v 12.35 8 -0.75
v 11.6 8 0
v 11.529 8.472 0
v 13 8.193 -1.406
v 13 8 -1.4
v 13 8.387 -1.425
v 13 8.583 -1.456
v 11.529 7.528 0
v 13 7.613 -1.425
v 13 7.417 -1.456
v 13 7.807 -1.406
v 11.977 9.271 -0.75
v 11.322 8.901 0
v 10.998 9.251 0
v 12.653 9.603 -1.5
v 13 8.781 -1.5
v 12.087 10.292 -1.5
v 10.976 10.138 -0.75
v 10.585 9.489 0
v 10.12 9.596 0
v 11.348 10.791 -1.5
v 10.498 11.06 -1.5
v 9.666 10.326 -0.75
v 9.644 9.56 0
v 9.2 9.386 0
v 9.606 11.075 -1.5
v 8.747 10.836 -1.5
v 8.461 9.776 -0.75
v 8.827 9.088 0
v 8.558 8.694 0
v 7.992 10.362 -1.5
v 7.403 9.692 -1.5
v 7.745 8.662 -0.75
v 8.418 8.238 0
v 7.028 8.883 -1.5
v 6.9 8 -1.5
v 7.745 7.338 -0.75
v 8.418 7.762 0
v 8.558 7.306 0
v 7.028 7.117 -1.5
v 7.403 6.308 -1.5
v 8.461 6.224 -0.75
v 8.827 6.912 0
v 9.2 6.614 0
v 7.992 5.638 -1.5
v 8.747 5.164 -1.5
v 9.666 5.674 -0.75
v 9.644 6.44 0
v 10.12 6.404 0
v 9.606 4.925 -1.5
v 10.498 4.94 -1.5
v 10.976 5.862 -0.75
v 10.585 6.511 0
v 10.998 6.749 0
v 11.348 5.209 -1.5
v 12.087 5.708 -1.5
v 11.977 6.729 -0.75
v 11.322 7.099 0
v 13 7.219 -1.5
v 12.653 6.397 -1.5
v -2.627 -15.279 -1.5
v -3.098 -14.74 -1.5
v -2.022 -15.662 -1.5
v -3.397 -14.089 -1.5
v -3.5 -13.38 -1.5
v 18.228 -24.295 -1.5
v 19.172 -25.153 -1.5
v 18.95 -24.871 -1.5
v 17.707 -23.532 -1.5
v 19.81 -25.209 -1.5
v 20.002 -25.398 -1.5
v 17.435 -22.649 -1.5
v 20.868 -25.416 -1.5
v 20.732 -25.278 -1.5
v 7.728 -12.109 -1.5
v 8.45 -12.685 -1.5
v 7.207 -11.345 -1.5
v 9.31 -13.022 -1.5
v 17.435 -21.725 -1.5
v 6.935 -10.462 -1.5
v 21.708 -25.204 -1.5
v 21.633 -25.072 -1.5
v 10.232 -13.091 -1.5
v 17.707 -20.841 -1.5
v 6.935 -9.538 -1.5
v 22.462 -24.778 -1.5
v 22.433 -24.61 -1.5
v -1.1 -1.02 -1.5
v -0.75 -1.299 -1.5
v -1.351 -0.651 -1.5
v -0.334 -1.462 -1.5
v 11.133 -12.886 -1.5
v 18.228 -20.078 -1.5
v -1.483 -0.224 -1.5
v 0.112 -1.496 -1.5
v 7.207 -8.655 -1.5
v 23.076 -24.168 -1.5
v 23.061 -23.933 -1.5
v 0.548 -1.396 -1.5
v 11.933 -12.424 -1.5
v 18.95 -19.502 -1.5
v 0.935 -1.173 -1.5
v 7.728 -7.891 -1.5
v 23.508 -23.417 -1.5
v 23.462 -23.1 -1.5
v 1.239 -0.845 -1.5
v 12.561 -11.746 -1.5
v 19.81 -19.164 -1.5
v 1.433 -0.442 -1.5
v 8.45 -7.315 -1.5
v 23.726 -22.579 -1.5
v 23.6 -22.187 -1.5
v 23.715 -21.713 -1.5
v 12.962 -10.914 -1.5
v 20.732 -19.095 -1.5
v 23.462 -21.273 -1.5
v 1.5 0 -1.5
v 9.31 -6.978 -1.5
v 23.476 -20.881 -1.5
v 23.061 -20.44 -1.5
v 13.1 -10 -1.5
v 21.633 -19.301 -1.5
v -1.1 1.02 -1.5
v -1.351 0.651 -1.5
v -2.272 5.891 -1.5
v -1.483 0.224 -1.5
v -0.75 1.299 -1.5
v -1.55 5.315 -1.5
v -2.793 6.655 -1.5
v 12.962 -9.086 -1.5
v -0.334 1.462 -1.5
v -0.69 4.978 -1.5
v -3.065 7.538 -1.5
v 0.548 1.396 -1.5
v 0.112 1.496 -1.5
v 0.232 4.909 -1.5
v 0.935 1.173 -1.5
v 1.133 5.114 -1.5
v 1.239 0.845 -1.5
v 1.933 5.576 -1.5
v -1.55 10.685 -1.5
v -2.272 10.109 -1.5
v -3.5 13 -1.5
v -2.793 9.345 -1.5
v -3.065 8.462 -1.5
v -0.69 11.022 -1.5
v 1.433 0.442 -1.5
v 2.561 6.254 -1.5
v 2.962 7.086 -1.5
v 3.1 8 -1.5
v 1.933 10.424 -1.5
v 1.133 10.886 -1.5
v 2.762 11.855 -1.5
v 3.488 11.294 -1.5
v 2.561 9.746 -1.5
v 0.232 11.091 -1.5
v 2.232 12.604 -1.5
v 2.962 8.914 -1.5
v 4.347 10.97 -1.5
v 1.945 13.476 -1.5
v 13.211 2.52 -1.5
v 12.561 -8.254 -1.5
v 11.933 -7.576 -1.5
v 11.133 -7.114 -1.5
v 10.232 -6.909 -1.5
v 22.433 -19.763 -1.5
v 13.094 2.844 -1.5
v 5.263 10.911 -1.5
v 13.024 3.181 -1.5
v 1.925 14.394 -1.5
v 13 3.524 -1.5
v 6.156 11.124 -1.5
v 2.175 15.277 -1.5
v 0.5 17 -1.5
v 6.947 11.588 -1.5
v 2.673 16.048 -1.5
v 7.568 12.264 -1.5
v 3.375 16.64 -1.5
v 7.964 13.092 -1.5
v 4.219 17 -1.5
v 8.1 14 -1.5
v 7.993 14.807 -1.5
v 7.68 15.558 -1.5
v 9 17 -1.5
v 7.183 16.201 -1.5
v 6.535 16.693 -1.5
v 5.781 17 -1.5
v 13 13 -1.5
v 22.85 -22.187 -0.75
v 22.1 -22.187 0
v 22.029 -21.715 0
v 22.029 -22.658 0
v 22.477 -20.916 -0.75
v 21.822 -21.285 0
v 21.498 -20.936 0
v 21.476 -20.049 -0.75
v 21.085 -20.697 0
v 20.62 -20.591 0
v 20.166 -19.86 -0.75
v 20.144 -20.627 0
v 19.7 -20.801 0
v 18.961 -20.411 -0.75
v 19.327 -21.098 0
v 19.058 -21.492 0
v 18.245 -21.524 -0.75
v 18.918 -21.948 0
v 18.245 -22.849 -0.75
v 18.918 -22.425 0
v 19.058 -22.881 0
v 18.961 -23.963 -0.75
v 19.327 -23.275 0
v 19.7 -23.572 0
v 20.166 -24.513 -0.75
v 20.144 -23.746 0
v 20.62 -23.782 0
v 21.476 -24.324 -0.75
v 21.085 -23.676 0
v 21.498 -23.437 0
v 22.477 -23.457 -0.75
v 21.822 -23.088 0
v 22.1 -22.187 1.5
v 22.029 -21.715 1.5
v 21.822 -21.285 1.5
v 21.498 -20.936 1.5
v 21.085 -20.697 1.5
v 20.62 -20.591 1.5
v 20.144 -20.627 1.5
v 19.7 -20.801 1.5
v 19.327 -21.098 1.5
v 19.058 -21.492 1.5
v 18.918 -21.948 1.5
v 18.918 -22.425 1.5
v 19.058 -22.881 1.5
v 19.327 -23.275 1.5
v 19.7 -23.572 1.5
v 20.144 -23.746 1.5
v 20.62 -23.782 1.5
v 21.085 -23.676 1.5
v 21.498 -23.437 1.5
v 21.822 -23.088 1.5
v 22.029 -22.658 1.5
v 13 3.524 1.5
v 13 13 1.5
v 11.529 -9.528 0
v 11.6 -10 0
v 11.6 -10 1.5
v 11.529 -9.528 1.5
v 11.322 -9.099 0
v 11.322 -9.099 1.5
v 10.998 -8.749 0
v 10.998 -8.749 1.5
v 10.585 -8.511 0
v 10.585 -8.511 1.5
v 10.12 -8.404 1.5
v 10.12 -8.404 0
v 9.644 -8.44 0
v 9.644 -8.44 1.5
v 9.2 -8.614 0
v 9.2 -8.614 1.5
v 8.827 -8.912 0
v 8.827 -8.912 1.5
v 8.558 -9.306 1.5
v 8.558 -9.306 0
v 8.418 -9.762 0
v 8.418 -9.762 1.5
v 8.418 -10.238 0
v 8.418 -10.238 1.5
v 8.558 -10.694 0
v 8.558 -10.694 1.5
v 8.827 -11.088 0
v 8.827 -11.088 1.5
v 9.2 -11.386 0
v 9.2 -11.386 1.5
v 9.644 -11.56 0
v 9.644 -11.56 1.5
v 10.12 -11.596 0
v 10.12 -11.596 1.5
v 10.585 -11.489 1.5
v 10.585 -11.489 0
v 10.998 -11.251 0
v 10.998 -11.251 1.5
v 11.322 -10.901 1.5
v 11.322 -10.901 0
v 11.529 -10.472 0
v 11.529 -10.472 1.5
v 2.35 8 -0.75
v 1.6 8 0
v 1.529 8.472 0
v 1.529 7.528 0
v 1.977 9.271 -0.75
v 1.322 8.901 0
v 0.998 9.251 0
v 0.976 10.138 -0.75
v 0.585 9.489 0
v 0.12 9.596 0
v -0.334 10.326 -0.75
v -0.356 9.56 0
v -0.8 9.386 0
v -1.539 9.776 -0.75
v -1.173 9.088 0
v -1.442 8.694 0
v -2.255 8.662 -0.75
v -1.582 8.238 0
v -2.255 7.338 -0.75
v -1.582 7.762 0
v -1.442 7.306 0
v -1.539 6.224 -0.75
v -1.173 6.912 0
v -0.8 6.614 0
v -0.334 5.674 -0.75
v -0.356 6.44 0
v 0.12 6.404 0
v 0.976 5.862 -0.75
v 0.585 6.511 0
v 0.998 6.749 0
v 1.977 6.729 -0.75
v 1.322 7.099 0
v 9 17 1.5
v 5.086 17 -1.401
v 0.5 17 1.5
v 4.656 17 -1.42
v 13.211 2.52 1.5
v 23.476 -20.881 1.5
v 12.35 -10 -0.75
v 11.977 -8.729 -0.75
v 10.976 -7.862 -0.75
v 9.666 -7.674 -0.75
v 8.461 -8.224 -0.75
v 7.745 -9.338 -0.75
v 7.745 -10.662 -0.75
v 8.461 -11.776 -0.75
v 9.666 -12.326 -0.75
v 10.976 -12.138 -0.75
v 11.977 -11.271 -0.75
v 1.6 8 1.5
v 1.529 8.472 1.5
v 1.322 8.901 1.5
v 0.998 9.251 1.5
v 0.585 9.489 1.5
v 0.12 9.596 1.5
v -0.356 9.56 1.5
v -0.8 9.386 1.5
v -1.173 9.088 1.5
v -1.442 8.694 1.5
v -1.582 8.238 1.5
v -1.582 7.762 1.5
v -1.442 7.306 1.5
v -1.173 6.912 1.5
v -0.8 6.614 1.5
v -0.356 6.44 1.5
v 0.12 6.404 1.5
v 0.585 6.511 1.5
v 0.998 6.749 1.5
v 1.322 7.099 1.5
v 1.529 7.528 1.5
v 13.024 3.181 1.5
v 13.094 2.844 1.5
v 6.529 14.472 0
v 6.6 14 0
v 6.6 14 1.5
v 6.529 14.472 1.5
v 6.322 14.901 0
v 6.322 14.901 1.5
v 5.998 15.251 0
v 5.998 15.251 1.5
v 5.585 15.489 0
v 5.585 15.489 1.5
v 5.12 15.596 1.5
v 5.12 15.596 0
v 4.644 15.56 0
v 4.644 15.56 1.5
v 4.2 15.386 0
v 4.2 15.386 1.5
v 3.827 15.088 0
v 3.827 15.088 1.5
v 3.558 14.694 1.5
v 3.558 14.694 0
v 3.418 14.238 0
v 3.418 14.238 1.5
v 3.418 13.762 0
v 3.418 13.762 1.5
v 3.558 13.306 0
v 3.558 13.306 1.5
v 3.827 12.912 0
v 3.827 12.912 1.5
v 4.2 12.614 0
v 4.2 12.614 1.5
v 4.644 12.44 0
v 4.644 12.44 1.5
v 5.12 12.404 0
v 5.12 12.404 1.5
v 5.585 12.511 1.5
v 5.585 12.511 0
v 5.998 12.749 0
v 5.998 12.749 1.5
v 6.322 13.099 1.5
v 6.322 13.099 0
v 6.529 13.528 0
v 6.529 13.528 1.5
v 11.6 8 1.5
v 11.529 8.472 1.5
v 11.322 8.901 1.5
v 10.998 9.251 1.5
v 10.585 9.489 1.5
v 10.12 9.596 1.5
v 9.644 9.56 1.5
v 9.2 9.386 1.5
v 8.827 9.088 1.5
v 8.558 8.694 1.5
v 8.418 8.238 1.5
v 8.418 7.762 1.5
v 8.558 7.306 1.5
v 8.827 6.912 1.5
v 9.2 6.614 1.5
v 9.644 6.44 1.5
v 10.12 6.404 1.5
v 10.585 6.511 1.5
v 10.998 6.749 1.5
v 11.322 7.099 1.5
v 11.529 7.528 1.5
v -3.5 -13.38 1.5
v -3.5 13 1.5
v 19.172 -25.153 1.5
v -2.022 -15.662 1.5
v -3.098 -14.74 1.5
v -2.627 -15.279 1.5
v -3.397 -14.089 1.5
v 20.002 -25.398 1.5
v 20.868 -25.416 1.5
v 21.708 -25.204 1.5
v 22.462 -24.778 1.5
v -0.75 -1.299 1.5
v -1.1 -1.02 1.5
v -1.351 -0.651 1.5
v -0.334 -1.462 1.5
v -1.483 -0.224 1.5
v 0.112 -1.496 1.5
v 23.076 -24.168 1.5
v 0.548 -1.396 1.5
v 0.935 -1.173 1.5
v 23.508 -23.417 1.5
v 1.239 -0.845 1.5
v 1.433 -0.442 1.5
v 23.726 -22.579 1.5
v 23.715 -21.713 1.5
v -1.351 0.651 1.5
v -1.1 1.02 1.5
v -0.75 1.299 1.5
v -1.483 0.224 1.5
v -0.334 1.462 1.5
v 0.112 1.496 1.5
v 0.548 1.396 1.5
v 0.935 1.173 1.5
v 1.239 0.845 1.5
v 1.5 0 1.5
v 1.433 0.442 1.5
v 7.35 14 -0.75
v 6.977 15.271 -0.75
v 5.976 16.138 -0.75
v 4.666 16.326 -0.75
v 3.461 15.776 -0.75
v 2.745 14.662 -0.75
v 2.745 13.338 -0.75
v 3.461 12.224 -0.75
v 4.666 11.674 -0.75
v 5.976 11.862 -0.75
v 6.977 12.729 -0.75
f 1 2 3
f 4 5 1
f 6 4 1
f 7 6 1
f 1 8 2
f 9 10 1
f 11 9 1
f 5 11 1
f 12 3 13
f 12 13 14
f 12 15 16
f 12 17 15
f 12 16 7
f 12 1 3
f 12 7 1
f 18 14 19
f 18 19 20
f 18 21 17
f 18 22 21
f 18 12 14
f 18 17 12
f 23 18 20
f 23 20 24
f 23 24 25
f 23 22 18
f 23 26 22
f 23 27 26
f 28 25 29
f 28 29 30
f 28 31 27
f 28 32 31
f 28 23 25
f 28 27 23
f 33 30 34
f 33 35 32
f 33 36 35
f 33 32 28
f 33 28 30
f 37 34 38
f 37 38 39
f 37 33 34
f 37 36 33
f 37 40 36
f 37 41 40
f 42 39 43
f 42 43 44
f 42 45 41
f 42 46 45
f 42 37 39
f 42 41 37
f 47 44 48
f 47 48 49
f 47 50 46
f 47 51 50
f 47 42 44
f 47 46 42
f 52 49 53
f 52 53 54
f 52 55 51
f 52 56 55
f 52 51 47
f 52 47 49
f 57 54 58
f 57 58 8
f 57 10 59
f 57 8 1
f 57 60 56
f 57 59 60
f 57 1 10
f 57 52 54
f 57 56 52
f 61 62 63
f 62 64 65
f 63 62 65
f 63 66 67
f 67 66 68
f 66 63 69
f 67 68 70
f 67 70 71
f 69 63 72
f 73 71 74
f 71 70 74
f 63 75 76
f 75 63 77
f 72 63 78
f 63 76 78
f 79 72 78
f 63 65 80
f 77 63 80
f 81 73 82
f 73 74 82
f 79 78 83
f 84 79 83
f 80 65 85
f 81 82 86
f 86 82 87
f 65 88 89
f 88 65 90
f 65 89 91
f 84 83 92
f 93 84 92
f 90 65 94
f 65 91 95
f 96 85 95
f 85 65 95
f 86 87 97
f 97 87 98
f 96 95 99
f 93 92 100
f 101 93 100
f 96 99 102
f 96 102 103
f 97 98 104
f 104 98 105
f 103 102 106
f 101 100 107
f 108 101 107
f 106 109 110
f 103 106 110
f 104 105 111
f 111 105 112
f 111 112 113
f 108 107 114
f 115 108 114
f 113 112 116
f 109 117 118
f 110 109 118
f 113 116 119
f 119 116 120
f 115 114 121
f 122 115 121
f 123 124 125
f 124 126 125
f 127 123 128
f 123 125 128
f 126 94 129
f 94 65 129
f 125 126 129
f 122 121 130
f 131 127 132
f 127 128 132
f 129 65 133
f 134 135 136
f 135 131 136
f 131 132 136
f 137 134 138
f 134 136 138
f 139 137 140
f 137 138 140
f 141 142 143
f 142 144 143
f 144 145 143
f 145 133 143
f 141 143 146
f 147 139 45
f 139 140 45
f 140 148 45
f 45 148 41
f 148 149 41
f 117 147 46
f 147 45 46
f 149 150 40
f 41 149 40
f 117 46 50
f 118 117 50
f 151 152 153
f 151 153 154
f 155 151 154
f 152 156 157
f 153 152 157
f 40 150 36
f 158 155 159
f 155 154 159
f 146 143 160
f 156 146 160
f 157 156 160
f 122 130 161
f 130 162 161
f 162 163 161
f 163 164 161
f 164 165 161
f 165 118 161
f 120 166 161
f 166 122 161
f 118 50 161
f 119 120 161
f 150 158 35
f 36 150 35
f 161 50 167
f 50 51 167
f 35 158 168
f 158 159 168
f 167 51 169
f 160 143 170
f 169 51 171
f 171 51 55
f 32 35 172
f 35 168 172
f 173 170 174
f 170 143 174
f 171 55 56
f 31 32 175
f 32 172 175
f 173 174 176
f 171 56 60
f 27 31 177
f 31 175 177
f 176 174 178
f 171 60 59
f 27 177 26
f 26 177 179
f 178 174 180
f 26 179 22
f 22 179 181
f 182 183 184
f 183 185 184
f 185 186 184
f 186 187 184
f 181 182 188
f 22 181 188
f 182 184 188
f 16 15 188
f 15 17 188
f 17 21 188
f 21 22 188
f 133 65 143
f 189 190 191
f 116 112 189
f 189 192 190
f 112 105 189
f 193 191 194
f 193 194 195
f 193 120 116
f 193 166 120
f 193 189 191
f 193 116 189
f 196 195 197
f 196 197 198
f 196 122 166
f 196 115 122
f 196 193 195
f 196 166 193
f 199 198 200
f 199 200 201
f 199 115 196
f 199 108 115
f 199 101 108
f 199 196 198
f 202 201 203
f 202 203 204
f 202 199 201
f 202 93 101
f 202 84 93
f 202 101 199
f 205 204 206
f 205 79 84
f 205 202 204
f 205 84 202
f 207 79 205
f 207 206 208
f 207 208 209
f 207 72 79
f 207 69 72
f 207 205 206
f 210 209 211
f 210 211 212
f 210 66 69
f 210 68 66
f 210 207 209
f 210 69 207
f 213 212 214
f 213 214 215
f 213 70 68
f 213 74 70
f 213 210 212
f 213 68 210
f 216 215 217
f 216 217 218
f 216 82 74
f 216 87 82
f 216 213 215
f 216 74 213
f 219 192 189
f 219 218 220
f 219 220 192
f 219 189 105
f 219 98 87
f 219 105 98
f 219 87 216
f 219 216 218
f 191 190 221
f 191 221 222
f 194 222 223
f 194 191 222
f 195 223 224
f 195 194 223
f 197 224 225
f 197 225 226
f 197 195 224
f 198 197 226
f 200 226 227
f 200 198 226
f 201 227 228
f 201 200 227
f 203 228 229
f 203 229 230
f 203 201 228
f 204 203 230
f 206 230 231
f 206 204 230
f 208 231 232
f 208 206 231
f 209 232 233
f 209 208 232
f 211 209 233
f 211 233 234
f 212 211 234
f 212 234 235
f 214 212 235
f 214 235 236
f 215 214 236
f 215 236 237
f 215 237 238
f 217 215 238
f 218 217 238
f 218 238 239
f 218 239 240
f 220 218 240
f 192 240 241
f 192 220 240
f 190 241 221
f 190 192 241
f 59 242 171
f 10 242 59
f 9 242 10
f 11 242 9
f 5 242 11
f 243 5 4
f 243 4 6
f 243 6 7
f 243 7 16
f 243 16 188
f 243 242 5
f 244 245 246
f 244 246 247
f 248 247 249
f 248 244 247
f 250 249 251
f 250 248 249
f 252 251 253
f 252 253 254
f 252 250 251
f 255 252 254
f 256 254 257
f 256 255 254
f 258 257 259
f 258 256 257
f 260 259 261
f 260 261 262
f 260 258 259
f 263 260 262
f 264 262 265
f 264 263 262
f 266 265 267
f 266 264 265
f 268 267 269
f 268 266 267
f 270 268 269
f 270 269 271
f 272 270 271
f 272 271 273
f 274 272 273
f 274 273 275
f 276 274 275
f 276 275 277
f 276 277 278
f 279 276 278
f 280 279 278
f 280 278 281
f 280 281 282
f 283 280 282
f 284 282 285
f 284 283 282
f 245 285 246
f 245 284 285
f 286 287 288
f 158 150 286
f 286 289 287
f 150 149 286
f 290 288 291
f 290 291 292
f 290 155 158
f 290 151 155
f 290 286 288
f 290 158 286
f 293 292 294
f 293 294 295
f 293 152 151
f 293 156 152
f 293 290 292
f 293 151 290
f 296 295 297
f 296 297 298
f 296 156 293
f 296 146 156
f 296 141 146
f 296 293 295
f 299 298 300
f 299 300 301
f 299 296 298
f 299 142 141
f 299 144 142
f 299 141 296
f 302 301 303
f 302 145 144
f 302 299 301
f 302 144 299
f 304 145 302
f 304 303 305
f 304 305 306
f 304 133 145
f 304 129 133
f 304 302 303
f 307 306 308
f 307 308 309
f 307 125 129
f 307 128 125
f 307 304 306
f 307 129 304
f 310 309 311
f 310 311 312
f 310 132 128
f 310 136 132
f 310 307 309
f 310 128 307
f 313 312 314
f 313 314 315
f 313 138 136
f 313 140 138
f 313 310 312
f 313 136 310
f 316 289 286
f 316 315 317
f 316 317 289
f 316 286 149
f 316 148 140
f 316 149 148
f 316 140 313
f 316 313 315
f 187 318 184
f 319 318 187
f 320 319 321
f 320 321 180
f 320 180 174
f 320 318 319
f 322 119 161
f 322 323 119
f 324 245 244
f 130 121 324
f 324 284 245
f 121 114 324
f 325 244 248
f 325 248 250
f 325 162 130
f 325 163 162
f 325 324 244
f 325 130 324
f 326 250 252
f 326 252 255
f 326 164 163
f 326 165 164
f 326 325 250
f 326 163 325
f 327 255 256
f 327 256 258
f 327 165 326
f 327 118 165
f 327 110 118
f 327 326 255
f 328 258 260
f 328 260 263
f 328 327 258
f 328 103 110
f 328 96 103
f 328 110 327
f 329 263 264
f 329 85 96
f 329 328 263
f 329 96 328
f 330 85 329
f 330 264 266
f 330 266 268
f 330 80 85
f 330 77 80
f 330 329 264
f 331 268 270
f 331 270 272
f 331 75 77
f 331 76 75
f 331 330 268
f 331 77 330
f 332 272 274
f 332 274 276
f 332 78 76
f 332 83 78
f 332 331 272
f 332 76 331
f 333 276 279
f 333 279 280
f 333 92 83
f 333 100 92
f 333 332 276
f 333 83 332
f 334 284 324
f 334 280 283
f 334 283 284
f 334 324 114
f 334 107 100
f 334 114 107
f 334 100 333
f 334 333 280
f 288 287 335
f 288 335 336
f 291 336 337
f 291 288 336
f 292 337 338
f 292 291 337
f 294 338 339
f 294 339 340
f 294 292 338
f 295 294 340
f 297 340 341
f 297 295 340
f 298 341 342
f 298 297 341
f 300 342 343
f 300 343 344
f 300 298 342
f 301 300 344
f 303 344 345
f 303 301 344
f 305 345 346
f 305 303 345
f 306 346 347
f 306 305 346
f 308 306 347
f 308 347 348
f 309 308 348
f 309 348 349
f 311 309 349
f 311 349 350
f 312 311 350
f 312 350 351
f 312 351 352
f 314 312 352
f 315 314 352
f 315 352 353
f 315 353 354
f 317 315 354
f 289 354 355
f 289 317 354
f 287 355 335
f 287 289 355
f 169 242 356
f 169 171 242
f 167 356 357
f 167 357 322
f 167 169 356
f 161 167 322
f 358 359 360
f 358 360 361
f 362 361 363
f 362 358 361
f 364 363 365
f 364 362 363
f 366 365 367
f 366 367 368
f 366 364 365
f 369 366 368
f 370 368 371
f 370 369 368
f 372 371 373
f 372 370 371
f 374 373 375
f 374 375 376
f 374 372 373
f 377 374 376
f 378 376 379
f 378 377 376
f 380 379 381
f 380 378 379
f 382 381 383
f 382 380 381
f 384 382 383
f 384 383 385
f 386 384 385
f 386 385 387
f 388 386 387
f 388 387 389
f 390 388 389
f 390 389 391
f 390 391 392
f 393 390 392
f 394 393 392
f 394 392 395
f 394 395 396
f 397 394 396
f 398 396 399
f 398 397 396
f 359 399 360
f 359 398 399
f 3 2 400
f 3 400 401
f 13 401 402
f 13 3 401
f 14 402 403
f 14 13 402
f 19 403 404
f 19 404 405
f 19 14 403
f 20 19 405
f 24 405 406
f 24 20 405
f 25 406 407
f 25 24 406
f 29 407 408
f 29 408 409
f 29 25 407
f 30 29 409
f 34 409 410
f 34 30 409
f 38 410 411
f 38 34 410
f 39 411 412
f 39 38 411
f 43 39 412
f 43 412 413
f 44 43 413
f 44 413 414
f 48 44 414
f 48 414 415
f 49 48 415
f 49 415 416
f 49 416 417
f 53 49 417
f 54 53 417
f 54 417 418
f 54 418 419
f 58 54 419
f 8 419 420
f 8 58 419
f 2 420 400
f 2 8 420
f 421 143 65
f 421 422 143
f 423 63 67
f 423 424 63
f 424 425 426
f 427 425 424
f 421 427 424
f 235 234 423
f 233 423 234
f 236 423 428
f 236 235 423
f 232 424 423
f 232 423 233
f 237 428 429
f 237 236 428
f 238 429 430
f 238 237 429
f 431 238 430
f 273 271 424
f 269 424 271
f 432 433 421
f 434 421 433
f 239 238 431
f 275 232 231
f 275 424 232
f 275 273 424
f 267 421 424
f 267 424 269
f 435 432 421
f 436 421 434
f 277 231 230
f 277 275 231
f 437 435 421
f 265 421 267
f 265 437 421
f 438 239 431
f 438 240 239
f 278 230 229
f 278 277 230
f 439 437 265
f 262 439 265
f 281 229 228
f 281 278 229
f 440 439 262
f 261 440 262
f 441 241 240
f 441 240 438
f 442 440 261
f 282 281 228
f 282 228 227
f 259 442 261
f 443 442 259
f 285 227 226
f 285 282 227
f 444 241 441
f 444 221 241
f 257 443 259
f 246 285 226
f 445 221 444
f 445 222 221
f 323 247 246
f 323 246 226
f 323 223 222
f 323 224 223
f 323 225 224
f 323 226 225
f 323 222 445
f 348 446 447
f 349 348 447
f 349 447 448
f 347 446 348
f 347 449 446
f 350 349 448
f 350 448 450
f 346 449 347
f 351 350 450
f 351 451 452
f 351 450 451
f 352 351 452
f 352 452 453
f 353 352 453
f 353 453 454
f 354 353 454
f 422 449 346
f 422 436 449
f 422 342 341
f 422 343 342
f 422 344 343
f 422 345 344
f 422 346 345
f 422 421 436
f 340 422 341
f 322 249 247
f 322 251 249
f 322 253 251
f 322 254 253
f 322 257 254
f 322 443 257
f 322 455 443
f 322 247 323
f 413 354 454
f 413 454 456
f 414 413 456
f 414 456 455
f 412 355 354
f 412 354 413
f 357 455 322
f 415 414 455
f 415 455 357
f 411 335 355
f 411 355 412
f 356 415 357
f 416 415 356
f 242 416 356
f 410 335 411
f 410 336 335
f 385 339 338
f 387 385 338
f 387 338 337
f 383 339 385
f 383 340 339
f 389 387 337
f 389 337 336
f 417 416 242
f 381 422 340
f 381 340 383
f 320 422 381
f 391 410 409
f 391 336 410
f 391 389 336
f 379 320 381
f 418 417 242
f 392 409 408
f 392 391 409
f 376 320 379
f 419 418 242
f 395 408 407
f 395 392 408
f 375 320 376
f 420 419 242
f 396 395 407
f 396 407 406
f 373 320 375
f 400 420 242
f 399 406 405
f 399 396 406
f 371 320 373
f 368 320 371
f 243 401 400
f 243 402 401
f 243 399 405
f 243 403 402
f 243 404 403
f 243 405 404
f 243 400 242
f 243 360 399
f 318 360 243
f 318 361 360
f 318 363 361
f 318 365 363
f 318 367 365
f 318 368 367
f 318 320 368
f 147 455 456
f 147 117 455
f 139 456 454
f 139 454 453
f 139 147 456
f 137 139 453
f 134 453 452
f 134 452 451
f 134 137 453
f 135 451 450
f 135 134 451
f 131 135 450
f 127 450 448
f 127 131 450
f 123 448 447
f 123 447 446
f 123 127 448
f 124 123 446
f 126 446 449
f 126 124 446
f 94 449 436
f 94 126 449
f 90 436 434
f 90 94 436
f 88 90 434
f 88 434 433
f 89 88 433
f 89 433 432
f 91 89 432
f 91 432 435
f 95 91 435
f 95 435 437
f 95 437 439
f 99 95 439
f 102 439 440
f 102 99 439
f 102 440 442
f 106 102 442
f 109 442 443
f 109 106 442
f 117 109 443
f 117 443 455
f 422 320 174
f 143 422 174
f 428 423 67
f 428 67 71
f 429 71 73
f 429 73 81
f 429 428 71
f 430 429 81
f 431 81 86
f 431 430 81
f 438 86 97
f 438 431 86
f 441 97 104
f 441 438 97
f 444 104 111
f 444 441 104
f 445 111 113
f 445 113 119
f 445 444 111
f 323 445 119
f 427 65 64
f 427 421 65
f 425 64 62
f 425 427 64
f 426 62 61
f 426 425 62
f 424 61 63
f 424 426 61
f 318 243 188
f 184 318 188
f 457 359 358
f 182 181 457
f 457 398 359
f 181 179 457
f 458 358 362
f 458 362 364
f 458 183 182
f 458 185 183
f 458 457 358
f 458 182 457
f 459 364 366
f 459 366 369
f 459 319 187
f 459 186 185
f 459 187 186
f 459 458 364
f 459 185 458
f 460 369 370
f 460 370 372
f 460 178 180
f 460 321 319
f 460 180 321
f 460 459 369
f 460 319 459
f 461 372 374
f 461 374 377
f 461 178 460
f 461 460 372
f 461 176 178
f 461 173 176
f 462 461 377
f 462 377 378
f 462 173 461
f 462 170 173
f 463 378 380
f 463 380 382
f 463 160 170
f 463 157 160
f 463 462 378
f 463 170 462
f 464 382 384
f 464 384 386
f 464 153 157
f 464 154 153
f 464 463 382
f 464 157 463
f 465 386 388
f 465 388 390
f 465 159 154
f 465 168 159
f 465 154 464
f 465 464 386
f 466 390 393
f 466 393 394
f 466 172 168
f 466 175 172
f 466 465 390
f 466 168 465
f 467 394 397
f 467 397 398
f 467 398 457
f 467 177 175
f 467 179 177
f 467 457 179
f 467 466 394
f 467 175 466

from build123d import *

# Parameters (mm, degrees)
SKETCH_1_R      = 1.5
SKETCH_1_R_2    = 1.6
EXTRUDE_1_DEPTH = 1.5
CHAMFER_1_SIZE  = 1.5
FILLET_1_R      = 2.5
CHAMFER_2_SIZE  = 4


with BuildPart() as part:
    # 草图1 → 凸台-拉伸1 (new, symmetric)
    with BuildSketch(Plane.XY):
        with BuildLine():
            Line((-3.5, 17), (-3.5, -15))
            Line((-3.5, -15), (19.171710101, -25.152700357))
            ThreePointArc((19.171710101, -25.152700357), (22.789314225, -24.493379894), (23.476214014, -20.880910968))
            Line((23.476214014, -20.880910968), (13, 3))
            Line((13, 3), (13, 17))
            Line((13, 17), (-3.5, 17))
        make_face()
        Circle(SKETCH_1_R, mode=Mode.SUBTRACT)
        with Locations((10, -10)):
            Circle(SKETCH_1_R_2, mode=Mode.SUBTRACT)
        with Locations((20.5, -22.186533479)):
            Circle(SKETCH_1_R_2, mode=Mode.SUBTRACT)
        with Locations((0, 8)):
            Circle(SKETCH_1_R_2, mode=Mode.SUBTRACT)
        with Locations((10, 8)):
            Circle(SKETCH_1_R_2, mode=Mode.SUBTRACT)
        with Locations((5, 14)):
            Circle(SKETCH_1_R_2, mode=Mode.SUBTRACT)
    extrude(amount=EXTRUDE_1_DEPTH, both=True)

    # 倒角1
    # the kernel refuses this chamfer: 1.5 mm, written as the material it takes off along each edge
    with BuildSketch(Plane(origin=(10, -10, -1.5), x_dir=(1, 0, 0), z_dir=(0, -1, 0))) as chamfer_1_piece_1:
        Polygon((1.6, CHAMFER_1_SIZE), (1.6 + CHAMFER_1_SIZE, 0), (1.6, 0), align=None)
    revolve(axis=Axis((10, -10, -1.5), (0, 0, 1)), mode=Mode.SUBTRACT)
    with BuildSketch(Plane(origin=(20.5, -22.186533479, -1.5), x_dir=(1, 0, 0), z_dir=(0, -1, 0))) as chamfer_1_piece_2:
        Polygon((1.6, CHAMFER_1_SIZE), (1.6 + CHAMFER_1_SIZE, 0), (1.6, 0), align=None)
    revolve(axis=Axis((20.5, -22.186533479, -1.5), (0, 0, 1)), mode=Mode.SUBTRACT)
    with BuildSketch(Plane(origin=(0, 8, -1.5), x_dir=(1, 0, 0), z_dir=(0, -1, 0))) as chamfer_1_piece_3:
        Polygon((1.6, CHAMFER_1_SIZE), (1.6 + CHAMFER_1_SIZE, 0), (1.6, 0), align=None)
    revolve(axis=Axis((0, 8, -1.5), (0, 0, 1)), mode=Mode.SUBTRACT)
    with BuildSketch(Plane(origin=(10, 8, -1.5), x_dir=(1, 0, 0), z_dir=(0, -1, 0))) as chamfer_1_piece_4:
        Polygon((1.6, CHAMFER_1_SIZE), (1.6 + CHAMFER_1_SIZE, 0), (1.6, 0), align=None)
    revolve(axis=Axis((10, 8, -1.5), (0, 0, 1)), mode=Mode.SUBTRACT)
    with BuildSketch(Plane(origin=(5, 14, -1.5), x_dir=(1, 0, 0), z_dir=(0, -1, 0))) as chamfer_1_piece_5:
        Polygon((1.6, CHAMFER_1_SIZE), (1.6 + CHAMFER_1_SIZE, 0), (1.6, 0), align=None)
    revolve(axis=Axis((5, 14, -1.5), (0, 0, 1)), mode=Mode.SUBTRACT)

    # 圆角1
    fillet_1_edges = [part.edges().sort_by_distance(p)[0] for p in [
        (13, 3, 0),
        (-3.5, -15, 0),
    ]]
    fillet(fillet_1_edges, radius=FILLET_1_R)

    # 倒角2
    chamfer_2_edges = [part.edges().sort_by_distance(p)[0] for p in [
        (13, 17, 0),
        (-3.5, 17, 0),
    ]]
    chamfer(chamfer_2_edges, length=CHAMFER_2_SIZE)


solid = part.part
